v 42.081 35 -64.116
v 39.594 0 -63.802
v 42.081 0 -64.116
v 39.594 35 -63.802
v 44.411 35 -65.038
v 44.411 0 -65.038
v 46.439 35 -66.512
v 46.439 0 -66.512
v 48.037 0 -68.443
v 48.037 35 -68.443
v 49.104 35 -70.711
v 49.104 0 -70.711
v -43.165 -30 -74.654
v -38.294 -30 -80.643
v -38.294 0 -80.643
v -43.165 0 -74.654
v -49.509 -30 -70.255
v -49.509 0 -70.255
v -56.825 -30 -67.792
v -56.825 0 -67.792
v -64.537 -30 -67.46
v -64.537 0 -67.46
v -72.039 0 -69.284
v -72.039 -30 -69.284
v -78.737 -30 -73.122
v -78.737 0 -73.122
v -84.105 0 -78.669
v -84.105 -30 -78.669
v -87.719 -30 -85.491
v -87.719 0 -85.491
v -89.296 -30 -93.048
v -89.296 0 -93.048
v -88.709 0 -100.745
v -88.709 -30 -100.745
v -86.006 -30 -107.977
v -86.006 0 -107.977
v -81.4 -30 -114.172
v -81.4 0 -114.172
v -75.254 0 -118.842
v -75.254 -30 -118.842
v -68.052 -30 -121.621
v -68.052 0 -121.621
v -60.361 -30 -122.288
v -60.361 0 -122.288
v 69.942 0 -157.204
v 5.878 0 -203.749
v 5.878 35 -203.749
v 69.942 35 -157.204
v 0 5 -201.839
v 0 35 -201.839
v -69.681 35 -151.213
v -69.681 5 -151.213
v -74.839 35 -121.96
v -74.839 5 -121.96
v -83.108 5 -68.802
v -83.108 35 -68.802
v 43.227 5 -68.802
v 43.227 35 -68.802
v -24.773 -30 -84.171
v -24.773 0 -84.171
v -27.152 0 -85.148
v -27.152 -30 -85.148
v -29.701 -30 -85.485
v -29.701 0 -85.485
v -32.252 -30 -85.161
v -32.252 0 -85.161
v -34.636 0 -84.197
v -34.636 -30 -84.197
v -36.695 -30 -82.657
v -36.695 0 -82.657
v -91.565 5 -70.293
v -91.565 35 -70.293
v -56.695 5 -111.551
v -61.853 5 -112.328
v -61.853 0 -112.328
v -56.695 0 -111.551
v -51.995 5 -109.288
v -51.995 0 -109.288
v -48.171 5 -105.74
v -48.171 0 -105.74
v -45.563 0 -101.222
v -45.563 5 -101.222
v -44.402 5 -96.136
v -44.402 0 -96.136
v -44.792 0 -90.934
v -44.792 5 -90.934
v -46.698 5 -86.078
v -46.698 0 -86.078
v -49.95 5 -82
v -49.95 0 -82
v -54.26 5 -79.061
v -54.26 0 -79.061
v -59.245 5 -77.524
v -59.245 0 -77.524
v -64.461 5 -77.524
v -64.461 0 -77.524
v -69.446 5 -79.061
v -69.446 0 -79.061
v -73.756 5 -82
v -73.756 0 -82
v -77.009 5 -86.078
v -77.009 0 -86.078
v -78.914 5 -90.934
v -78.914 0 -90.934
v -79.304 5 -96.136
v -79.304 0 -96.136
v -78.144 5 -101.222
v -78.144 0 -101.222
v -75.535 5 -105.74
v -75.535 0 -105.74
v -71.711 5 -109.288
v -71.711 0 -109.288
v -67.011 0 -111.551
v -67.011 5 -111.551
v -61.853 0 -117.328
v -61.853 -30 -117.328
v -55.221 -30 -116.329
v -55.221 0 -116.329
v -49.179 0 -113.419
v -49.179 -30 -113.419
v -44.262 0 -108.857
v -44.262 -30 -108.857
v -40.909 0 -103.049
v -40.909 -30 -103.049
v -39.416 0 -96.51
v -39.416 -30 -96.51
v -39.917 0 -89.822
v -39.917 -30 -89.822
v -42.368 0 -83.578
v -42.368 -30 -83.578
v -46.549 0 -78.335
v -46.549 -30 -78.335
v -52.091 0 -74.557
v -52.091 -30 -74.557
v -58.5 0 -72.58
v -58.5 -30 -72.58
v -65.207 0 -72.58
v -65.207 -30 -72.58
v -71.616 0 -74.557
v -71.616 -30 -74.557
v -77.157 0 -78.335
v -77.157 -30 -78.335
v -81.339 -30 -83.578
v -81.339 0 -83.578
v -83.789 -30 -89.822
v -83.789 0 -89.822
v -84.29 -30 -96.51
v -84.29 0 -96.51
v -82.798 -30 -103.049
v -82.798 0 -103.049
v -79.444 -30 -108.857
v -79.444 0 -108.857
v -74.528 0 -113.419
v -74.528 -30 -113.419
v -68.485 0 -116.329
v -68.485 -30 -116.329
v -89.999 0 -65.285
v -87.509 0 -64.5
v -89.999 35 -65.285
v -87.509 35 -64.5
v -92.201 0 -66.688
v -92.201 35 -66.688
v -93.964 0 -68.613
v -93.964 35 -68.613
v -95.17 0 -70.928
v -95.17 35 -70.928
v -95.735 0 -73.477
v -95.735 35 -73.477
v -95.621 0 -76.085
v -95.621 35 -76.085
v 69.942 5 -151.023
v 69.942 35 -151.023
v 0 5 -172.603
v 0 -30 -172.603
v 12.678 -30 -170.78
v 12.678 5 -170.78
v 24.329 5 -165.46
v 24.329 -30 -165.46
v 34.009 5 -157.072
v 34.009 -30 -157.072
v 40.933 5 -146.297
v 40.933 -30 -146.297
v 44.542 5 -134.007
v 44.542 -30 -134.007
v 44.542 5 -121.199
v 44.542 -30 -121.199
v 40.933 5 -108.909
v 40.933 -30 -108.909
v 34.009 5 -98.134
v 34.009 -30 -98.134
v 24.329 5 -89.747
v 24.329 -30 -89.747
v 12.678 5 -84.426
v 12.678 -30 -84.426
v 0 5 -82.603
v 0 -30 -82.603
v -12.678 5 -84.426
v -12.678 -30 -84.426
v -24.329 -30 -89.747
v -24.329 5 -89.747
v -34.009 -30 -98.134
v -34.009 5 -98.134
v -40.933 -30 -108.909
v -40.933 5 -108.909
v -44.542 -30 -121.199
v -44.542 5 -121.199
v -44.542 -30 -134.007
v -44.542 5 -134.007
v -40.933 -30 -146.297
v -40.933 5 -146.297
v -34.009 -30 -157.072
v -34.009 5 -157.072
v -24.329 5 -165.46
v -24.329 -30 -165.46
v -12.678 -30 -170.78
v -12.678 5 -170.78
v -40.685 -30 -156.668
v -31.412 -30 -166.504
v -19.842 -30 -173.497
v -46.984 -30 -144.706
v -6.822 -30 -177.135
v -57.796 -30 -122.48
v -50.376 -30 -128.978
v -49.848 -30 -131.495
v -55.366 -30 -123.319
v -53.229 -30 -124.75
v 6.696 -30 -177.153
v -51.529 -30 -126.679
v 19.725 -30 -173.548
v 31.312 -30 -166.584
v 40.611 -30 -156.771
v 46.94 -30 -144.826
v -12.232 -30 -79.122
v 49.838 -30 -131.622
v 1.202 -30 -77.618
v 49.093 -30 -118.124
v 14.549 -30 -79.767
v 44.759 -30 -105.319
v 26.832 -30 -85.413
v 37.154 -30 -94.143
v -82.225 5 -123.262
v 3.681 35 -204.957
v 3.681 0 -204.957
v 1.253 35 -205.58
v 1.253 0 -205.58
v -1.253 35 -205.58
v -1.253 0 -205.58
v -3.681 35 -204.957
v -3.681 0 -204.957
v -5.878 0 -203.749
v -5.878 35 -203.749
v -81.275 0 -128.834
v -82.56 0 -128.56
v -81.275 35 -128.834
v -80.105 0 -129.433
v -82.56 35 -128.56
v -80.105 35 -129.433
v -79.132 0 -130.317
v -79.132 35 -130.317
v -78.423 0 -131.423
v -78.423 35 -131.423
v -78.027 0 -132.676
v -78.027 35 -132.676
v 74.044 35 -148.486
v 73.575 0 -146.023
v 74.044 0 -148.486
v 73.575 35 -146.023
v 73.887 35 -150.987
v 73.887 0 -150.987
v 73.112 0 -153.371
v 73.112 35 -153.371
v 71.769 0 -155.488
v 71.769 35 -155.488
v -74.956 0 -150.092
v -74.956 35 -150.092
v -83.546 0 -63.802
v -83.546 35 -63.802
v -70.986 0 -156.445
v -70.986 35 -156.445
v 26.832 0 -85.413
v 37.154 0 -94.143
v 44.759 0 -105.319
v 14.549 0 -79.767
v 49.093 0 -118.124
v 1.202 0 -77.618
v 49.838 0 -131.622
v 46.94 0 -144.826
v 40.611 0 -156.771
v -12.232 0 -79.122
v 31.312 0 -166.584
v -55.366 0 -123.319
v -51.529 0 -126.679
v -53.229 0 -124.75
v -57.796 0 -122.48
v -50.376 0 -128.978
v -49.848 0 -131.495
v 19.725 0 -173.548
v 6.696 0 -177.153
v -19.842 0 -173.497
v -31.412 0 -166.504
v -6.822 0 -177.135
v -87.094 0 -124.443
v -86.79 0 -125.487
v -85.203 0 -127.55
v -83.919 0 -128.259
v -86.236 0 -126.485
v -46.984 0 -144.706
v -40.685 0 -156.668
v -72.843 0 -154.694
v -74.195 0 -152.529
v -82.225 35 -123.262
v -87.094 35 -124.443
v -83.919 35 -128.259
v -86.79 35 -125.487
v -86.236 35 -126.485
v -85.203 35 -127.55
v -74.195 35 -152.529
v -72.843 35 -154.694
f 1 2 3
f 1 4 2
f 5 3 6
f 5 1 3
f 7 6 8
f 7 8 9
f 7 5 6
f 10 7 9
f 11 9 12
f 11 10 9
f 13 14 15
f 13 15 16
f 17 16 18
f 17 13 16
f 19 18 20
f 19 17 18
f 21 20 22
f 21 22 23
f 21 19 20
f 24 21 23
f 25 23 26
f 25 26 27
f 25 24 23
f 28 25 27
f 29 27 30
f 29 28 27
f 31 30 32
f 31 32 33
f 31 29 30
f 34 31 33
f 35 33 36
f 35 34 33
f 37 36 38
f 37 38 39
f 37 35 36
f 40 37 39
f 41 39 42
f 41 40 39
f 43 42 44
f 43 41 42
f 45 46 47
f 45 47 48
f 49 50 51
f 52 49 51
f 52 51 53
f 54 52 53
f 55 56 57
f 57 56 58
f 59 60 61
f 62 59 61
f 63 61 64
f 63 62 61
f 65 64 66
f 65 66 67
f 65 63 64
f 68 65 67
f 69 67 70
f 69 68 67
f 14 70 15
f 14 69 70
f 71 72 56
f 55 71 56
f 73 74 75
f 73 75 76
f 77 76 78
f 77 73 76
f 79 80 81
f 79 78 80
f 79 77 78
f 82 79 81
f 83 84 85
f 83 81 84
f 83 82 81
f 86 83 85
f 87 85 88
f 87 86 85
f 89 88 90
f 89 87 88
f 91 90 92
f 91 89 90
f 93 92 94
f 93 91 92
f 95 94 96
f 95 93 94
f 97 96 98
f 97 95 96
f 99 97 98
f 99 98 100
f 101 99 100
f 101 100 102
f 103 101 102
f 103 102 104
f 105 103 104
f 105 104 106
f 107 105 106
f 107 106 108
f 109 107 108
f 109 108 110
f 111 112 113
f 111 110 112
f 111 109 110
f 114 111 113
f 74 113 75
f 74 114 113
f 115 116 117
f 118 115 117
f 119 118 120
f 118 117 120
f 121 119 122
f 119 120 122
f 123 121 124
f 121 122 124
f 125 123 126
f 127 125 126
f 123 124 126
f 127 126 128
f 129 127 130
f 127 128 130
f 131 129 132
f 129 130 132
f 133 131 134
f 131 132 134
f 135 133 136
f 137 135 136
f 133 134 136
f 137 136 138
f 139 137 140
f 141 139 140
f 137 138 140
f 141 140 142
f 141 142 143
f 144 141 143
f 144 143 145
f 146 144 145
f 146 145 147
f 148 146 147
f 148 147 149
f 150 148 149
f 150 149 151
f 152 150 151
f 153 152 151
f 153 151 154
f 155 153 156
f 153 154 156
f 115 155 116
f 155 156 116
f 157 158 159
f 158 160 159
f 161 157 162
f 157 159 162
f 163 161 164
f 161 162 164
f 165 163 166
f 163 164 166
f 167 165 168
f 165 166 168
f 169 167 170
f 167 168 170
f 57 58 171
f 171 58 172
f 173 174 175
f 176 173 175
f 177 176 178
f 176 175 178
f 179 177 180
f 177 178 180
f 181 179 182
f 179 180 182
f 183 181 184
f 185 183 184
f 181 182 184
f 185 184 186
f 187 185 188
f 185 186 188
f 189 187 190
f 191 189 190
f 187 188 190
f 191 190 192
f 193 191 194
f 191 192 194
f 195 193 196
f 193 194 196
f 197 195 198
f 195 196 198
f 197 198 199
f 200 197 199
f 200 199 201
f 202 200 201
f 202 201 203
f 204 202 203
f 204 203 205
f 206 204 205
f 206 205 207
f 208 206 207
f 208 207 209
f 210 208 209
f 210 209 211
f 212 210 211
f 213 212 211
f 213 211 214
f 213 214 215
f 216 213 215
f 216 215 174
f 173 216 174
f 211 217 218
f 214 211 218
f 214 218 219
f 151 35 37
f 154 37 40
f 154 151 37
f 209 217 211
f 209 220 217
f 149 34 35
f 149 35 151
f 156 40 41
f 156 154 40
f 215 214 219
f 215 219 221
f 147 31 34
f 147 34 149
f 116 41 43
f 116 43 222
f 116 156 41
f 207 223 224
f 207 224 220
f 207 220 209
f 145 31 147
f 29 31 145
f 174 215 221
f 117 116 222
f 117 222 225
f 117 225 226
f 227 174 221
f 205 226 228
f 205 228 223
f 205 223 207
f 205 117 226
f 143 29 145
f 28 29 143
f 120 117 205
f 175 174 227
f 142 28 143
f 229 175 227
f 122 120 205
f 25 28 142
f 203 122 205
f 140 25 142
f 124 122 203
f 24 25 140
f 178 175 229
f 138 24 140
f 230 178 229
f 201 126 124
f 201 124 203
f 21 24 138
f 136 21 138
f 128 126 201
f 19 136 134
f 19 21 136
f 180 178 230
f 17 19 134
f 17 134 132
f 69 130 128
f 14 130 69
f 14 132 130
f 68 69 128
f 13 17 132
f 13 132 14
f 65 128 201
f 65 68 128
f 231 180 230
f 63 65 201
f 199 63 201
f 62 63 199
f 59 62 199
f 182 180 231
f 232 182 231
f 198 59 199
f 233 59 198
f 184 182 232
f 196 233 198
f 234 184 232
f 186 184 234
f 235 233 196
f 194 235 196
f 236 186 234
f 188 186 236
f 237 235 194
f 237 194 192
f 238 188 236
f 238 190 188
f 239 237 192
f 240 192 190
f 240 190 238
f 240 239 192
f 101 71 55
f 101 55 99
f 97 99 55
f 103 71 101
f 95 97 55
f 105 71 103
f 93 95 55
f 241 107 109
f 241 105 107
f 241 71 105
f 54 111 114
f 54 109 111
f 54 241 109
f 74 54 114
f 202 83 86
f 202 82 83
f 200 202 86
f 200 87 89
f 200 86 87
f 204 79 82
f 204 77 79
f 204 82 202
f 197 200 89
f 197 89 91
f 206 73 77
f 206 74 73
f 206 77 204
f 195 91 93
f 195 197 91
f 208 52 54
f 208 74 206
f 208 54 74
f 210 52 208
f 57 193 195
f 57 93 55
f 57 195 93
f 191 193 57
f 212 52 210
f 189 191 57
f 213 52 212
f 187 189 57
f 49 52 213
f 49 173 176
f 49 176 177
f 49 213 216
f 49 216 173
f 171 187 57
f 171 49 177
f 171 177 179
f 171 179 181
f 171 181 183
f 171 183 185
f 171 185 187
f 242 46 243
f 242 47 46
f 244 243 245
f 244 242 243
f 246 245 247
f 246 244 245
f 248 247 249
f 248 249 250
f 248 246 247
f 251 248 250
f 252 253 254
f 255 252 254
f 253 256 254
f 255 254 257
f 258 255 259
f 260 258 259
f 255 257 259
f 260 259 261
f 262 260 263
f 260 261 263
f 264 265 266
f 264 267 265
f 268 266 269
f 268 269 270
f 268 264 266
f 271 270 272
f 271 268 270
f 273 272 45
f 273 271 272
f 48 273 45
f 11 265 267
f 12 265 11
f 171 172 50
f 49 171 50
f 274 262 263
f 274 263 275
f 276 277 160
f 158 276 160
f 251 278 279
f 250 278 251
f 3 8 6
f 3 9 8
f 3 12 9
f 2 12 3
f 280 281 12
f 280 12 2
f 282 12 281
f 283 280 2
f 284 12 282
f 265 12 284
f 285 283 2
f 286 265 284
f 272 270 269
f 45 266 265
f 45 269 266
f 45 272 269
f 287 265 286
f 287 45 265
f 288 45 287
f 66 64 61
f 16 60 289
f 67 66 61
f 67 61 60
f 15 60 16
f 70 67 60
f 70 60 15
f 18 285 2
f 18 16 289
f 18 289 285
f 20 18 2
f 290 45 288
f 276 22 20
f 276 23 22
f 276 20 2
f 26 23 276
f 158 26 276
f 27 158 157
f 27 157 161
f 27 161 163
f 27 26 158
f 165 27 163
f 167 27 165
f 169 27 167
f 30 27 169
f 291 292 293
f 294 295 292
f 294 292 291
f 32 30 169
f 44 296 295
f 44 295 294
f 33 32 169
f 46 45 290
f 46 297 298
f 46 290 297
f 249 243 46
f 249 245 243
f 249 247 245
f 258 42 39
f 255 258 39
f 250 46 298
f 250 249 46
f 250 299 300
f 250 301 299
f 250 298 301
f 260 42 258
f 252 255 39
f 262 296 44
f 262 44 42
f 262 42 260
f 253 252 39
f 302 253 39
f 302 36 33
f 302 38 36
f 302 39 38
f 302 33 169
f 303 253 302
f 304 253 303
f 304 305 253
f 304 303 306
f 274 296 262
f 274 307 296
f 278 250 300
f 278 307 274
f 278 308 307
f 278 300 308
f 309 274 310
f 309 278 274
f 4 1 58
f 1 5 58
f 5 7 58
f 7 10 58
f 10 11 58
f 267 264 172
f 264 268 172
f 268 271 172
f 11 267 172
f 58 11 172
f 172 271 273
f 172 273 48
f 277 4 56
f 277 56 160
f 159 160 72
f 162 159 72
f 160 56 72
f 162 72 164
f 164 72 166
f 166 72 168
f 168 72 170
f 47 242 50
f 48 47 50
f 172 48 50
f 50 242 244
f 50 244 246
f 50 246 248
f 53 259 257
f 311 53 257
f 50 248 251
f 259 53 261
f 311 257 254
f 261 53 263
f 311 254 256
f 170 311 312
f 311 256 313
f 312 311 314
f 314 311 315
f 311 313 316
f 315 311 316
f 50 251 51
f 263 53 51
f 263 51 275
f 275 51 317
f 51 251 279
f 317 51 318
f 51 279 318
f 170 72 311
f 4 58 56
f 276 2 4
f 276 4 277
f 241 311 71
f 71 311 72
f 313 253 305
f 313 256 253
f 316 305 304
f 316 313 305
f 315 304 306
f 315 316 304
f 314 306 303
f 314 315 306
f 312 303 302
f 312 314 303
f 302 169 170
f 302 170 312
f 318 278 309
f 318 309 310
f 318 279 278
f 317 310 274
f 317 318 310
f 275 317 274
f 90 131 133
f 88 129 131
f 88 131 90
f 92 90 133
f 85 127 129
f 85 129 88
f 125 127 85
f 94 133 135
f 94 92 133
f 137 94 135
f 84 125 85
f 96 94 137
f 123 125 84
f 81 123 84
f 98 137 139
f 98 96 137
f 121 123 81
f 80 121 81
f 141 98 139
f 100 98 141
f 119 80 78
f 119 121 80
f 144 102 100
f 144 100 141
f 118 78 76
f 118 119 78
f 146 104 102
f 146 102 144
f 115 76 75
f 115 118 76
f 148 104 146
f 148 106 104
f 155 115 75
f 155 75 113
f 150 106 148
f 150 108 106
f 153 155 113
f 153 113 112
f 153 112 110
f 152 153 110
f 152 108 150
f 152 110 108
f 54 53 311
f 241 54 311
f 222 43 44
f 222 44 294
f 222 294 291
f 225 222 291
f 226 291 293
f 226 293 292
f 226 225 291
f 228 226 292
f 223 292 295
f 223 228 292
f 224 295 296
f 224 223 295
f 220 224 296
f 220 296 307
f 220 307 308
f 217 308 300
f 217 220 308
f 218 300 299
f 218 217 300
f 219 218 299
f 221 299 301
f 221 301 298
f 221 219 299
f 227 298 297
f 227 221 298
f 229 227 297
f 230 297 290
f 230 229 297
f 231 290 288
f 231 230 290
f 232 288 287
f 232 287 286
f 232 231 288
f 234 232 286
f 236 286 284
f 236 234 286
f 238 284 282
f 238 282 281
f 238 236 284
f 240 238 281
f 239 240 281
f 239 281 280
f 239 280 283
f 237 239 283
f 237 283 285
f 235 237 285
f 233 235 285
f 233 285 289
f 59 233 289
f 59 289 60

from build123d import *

# Parameters (mm, degrees)
SKETCH1_R               = 45
BOSS_EXTRUDE1_DEPTH     = 35
CUT_EXTRUDE1_DEPTH      = 30
BOSS_EXTRUDE6_START     = 30
SKETCH4_R               = 22.5
SKETCH4_R_2             = 45
BOSS_EXTRUDE6_DEPTH     = 30
CUT_EXTRUDE5_DEPTH      = 233.326481949
CUT_EXTRUDE5_DEPTH_BACK = 233.326481949
SKETCH11_R              = 17.5
FILLET5_R               = 10
FILLET7_R               = 5
FILLET8_R               = 5


with BuildPart() as part:
    # Sketch1 → Boss-Extrude1 (new body)
    with BuildSketch(Plane(origin=(0, 0, 0), x_dir=(1, 0, 0), z_dir=(0, 1, 0))):
        Polygon((46.859255168, 63.80155033), (-83.545615043, 63.80155033), (-97.357476794, 66.23695421), (-86.281022646, 129.054647247), (-78.894964498, 127.752285914), (-74.254340533, 154.070572239), (0, 208.019508525), (75.819867549, 152.933150283), align=None)
        with Locations(Location((0, 127.60310066, 0), (0, 0, 90))):
            Circle(SKETCH1_R, mode=Mode.SUBTRACT)
    extrude(amount=BOSS_EXTRUDE1_DEPTH)

    # Sketch2 → Cut-Extrude1 (cut)
    with BuildSketch(Plane(origin=(0, 35, 0), x_dir=(1, 0, 0), z_dir=(0, 1, 0))):
        Polygon((69.942015026, 151.023320226), (0, 201.839168637), (-69.681093857, 151.212890552), (-74.839166621, 121.960006261), (-82.225224769, 123.262367593), (-91.56519714, 70.292752087), (-83.108171726, 68.80155033), (43.226542528, 68.80155033), align=None)
    extrude(amount=-CUT_EXTRUDE1_DEPTH, mode=Mode.SUBTRACT)

    # Sketch4 → Boss-Extrude6 (add)
    with BuildSketch(Plane.XZ.offset(BOSS_EXTRUDE6_START)):
        with BuildLine():
            ThreePointArc((-38.294135291, -80.643268154), (-86.152709956, -81.952683716), (-60.360710902, -122.287910539))
            ThreePointArc((-60.360710902, -122.287910539), (-53.229459059, -124.750444519), (-49.848314613, -131.494826529))
            ThreePointArc((-49.848314613, -131.494826529), (44.180876901, -151.013570888), (-24.772660509, -84.171369273))
            ThreePointArc((-24.772660509, -84.171369273), (-32.2519207, -85.161062892), (-38.294135291, -80.643268154))
        make_face()
        with Locations(Location((-61.853227661, -94.828442341, 0), (0, 0, 270))):
            Circle(SKETCH4_R, mode=Mode.SUBTRACT)
        with Locations(Location((0, -127.60310066, 0), (0, 0, 270))):
            Circle(SKETCH4_R_2, mode=Mode.SUBTRACT)
    extrude(amount=-BOSS_EXTRUDE6_DEPTH)

    # Sketch11 → Cut-Extrude5 (cut, two sides: drawn at the far end of the back side and taken through both)
    with BuildSketch(Plane.XZ.offset(-CUT_EXTRUDE5_DEPTH_BACK)):
        with Locations(Location((-61.853227661, -94.828442341, 0), (0, 0, 270))):
            Circle(SKETCH11_R)
    extrude(amount=CUT_EXTRUDE5_DEPTH + CUT_EXTRUDE5_DEPTH_BACK, mode=Mode.SUBTRACT)

    # Fillet5
    fillet5_edges = [part.edges().sort_by_distance(p)[0] for p in [
        (-97.357476794, 17.5, -66.23695421),
        (-74.254340533, 17.5, -154.070572239),
        (0, 17.5, -208.019508525),
        (75.819867549, 17.5, -152.933150283),
        (46.859255168, 17.5, -63.80155033),
    ]]
    fillet(fillet5_edges, radius=FILLET5_R)

    # Fillet7
    fillet7_edges = [part.edges().sort_by_distance(p)[0] for p in [
        (-78.894964498, 17.5, -127.752285914),
    ]]
    fillet(fillet7_edges, radius=FILLET7_R)

    # Fillet8
    fillet8_edges = [part.edges().sort_by_distance(p)[0] for p in [
        (-86.281022646, 17.5, -129.054647247),
    ]]
    fillet(fillet8_edges, radius=FILLET8_R)


solid = part.part
